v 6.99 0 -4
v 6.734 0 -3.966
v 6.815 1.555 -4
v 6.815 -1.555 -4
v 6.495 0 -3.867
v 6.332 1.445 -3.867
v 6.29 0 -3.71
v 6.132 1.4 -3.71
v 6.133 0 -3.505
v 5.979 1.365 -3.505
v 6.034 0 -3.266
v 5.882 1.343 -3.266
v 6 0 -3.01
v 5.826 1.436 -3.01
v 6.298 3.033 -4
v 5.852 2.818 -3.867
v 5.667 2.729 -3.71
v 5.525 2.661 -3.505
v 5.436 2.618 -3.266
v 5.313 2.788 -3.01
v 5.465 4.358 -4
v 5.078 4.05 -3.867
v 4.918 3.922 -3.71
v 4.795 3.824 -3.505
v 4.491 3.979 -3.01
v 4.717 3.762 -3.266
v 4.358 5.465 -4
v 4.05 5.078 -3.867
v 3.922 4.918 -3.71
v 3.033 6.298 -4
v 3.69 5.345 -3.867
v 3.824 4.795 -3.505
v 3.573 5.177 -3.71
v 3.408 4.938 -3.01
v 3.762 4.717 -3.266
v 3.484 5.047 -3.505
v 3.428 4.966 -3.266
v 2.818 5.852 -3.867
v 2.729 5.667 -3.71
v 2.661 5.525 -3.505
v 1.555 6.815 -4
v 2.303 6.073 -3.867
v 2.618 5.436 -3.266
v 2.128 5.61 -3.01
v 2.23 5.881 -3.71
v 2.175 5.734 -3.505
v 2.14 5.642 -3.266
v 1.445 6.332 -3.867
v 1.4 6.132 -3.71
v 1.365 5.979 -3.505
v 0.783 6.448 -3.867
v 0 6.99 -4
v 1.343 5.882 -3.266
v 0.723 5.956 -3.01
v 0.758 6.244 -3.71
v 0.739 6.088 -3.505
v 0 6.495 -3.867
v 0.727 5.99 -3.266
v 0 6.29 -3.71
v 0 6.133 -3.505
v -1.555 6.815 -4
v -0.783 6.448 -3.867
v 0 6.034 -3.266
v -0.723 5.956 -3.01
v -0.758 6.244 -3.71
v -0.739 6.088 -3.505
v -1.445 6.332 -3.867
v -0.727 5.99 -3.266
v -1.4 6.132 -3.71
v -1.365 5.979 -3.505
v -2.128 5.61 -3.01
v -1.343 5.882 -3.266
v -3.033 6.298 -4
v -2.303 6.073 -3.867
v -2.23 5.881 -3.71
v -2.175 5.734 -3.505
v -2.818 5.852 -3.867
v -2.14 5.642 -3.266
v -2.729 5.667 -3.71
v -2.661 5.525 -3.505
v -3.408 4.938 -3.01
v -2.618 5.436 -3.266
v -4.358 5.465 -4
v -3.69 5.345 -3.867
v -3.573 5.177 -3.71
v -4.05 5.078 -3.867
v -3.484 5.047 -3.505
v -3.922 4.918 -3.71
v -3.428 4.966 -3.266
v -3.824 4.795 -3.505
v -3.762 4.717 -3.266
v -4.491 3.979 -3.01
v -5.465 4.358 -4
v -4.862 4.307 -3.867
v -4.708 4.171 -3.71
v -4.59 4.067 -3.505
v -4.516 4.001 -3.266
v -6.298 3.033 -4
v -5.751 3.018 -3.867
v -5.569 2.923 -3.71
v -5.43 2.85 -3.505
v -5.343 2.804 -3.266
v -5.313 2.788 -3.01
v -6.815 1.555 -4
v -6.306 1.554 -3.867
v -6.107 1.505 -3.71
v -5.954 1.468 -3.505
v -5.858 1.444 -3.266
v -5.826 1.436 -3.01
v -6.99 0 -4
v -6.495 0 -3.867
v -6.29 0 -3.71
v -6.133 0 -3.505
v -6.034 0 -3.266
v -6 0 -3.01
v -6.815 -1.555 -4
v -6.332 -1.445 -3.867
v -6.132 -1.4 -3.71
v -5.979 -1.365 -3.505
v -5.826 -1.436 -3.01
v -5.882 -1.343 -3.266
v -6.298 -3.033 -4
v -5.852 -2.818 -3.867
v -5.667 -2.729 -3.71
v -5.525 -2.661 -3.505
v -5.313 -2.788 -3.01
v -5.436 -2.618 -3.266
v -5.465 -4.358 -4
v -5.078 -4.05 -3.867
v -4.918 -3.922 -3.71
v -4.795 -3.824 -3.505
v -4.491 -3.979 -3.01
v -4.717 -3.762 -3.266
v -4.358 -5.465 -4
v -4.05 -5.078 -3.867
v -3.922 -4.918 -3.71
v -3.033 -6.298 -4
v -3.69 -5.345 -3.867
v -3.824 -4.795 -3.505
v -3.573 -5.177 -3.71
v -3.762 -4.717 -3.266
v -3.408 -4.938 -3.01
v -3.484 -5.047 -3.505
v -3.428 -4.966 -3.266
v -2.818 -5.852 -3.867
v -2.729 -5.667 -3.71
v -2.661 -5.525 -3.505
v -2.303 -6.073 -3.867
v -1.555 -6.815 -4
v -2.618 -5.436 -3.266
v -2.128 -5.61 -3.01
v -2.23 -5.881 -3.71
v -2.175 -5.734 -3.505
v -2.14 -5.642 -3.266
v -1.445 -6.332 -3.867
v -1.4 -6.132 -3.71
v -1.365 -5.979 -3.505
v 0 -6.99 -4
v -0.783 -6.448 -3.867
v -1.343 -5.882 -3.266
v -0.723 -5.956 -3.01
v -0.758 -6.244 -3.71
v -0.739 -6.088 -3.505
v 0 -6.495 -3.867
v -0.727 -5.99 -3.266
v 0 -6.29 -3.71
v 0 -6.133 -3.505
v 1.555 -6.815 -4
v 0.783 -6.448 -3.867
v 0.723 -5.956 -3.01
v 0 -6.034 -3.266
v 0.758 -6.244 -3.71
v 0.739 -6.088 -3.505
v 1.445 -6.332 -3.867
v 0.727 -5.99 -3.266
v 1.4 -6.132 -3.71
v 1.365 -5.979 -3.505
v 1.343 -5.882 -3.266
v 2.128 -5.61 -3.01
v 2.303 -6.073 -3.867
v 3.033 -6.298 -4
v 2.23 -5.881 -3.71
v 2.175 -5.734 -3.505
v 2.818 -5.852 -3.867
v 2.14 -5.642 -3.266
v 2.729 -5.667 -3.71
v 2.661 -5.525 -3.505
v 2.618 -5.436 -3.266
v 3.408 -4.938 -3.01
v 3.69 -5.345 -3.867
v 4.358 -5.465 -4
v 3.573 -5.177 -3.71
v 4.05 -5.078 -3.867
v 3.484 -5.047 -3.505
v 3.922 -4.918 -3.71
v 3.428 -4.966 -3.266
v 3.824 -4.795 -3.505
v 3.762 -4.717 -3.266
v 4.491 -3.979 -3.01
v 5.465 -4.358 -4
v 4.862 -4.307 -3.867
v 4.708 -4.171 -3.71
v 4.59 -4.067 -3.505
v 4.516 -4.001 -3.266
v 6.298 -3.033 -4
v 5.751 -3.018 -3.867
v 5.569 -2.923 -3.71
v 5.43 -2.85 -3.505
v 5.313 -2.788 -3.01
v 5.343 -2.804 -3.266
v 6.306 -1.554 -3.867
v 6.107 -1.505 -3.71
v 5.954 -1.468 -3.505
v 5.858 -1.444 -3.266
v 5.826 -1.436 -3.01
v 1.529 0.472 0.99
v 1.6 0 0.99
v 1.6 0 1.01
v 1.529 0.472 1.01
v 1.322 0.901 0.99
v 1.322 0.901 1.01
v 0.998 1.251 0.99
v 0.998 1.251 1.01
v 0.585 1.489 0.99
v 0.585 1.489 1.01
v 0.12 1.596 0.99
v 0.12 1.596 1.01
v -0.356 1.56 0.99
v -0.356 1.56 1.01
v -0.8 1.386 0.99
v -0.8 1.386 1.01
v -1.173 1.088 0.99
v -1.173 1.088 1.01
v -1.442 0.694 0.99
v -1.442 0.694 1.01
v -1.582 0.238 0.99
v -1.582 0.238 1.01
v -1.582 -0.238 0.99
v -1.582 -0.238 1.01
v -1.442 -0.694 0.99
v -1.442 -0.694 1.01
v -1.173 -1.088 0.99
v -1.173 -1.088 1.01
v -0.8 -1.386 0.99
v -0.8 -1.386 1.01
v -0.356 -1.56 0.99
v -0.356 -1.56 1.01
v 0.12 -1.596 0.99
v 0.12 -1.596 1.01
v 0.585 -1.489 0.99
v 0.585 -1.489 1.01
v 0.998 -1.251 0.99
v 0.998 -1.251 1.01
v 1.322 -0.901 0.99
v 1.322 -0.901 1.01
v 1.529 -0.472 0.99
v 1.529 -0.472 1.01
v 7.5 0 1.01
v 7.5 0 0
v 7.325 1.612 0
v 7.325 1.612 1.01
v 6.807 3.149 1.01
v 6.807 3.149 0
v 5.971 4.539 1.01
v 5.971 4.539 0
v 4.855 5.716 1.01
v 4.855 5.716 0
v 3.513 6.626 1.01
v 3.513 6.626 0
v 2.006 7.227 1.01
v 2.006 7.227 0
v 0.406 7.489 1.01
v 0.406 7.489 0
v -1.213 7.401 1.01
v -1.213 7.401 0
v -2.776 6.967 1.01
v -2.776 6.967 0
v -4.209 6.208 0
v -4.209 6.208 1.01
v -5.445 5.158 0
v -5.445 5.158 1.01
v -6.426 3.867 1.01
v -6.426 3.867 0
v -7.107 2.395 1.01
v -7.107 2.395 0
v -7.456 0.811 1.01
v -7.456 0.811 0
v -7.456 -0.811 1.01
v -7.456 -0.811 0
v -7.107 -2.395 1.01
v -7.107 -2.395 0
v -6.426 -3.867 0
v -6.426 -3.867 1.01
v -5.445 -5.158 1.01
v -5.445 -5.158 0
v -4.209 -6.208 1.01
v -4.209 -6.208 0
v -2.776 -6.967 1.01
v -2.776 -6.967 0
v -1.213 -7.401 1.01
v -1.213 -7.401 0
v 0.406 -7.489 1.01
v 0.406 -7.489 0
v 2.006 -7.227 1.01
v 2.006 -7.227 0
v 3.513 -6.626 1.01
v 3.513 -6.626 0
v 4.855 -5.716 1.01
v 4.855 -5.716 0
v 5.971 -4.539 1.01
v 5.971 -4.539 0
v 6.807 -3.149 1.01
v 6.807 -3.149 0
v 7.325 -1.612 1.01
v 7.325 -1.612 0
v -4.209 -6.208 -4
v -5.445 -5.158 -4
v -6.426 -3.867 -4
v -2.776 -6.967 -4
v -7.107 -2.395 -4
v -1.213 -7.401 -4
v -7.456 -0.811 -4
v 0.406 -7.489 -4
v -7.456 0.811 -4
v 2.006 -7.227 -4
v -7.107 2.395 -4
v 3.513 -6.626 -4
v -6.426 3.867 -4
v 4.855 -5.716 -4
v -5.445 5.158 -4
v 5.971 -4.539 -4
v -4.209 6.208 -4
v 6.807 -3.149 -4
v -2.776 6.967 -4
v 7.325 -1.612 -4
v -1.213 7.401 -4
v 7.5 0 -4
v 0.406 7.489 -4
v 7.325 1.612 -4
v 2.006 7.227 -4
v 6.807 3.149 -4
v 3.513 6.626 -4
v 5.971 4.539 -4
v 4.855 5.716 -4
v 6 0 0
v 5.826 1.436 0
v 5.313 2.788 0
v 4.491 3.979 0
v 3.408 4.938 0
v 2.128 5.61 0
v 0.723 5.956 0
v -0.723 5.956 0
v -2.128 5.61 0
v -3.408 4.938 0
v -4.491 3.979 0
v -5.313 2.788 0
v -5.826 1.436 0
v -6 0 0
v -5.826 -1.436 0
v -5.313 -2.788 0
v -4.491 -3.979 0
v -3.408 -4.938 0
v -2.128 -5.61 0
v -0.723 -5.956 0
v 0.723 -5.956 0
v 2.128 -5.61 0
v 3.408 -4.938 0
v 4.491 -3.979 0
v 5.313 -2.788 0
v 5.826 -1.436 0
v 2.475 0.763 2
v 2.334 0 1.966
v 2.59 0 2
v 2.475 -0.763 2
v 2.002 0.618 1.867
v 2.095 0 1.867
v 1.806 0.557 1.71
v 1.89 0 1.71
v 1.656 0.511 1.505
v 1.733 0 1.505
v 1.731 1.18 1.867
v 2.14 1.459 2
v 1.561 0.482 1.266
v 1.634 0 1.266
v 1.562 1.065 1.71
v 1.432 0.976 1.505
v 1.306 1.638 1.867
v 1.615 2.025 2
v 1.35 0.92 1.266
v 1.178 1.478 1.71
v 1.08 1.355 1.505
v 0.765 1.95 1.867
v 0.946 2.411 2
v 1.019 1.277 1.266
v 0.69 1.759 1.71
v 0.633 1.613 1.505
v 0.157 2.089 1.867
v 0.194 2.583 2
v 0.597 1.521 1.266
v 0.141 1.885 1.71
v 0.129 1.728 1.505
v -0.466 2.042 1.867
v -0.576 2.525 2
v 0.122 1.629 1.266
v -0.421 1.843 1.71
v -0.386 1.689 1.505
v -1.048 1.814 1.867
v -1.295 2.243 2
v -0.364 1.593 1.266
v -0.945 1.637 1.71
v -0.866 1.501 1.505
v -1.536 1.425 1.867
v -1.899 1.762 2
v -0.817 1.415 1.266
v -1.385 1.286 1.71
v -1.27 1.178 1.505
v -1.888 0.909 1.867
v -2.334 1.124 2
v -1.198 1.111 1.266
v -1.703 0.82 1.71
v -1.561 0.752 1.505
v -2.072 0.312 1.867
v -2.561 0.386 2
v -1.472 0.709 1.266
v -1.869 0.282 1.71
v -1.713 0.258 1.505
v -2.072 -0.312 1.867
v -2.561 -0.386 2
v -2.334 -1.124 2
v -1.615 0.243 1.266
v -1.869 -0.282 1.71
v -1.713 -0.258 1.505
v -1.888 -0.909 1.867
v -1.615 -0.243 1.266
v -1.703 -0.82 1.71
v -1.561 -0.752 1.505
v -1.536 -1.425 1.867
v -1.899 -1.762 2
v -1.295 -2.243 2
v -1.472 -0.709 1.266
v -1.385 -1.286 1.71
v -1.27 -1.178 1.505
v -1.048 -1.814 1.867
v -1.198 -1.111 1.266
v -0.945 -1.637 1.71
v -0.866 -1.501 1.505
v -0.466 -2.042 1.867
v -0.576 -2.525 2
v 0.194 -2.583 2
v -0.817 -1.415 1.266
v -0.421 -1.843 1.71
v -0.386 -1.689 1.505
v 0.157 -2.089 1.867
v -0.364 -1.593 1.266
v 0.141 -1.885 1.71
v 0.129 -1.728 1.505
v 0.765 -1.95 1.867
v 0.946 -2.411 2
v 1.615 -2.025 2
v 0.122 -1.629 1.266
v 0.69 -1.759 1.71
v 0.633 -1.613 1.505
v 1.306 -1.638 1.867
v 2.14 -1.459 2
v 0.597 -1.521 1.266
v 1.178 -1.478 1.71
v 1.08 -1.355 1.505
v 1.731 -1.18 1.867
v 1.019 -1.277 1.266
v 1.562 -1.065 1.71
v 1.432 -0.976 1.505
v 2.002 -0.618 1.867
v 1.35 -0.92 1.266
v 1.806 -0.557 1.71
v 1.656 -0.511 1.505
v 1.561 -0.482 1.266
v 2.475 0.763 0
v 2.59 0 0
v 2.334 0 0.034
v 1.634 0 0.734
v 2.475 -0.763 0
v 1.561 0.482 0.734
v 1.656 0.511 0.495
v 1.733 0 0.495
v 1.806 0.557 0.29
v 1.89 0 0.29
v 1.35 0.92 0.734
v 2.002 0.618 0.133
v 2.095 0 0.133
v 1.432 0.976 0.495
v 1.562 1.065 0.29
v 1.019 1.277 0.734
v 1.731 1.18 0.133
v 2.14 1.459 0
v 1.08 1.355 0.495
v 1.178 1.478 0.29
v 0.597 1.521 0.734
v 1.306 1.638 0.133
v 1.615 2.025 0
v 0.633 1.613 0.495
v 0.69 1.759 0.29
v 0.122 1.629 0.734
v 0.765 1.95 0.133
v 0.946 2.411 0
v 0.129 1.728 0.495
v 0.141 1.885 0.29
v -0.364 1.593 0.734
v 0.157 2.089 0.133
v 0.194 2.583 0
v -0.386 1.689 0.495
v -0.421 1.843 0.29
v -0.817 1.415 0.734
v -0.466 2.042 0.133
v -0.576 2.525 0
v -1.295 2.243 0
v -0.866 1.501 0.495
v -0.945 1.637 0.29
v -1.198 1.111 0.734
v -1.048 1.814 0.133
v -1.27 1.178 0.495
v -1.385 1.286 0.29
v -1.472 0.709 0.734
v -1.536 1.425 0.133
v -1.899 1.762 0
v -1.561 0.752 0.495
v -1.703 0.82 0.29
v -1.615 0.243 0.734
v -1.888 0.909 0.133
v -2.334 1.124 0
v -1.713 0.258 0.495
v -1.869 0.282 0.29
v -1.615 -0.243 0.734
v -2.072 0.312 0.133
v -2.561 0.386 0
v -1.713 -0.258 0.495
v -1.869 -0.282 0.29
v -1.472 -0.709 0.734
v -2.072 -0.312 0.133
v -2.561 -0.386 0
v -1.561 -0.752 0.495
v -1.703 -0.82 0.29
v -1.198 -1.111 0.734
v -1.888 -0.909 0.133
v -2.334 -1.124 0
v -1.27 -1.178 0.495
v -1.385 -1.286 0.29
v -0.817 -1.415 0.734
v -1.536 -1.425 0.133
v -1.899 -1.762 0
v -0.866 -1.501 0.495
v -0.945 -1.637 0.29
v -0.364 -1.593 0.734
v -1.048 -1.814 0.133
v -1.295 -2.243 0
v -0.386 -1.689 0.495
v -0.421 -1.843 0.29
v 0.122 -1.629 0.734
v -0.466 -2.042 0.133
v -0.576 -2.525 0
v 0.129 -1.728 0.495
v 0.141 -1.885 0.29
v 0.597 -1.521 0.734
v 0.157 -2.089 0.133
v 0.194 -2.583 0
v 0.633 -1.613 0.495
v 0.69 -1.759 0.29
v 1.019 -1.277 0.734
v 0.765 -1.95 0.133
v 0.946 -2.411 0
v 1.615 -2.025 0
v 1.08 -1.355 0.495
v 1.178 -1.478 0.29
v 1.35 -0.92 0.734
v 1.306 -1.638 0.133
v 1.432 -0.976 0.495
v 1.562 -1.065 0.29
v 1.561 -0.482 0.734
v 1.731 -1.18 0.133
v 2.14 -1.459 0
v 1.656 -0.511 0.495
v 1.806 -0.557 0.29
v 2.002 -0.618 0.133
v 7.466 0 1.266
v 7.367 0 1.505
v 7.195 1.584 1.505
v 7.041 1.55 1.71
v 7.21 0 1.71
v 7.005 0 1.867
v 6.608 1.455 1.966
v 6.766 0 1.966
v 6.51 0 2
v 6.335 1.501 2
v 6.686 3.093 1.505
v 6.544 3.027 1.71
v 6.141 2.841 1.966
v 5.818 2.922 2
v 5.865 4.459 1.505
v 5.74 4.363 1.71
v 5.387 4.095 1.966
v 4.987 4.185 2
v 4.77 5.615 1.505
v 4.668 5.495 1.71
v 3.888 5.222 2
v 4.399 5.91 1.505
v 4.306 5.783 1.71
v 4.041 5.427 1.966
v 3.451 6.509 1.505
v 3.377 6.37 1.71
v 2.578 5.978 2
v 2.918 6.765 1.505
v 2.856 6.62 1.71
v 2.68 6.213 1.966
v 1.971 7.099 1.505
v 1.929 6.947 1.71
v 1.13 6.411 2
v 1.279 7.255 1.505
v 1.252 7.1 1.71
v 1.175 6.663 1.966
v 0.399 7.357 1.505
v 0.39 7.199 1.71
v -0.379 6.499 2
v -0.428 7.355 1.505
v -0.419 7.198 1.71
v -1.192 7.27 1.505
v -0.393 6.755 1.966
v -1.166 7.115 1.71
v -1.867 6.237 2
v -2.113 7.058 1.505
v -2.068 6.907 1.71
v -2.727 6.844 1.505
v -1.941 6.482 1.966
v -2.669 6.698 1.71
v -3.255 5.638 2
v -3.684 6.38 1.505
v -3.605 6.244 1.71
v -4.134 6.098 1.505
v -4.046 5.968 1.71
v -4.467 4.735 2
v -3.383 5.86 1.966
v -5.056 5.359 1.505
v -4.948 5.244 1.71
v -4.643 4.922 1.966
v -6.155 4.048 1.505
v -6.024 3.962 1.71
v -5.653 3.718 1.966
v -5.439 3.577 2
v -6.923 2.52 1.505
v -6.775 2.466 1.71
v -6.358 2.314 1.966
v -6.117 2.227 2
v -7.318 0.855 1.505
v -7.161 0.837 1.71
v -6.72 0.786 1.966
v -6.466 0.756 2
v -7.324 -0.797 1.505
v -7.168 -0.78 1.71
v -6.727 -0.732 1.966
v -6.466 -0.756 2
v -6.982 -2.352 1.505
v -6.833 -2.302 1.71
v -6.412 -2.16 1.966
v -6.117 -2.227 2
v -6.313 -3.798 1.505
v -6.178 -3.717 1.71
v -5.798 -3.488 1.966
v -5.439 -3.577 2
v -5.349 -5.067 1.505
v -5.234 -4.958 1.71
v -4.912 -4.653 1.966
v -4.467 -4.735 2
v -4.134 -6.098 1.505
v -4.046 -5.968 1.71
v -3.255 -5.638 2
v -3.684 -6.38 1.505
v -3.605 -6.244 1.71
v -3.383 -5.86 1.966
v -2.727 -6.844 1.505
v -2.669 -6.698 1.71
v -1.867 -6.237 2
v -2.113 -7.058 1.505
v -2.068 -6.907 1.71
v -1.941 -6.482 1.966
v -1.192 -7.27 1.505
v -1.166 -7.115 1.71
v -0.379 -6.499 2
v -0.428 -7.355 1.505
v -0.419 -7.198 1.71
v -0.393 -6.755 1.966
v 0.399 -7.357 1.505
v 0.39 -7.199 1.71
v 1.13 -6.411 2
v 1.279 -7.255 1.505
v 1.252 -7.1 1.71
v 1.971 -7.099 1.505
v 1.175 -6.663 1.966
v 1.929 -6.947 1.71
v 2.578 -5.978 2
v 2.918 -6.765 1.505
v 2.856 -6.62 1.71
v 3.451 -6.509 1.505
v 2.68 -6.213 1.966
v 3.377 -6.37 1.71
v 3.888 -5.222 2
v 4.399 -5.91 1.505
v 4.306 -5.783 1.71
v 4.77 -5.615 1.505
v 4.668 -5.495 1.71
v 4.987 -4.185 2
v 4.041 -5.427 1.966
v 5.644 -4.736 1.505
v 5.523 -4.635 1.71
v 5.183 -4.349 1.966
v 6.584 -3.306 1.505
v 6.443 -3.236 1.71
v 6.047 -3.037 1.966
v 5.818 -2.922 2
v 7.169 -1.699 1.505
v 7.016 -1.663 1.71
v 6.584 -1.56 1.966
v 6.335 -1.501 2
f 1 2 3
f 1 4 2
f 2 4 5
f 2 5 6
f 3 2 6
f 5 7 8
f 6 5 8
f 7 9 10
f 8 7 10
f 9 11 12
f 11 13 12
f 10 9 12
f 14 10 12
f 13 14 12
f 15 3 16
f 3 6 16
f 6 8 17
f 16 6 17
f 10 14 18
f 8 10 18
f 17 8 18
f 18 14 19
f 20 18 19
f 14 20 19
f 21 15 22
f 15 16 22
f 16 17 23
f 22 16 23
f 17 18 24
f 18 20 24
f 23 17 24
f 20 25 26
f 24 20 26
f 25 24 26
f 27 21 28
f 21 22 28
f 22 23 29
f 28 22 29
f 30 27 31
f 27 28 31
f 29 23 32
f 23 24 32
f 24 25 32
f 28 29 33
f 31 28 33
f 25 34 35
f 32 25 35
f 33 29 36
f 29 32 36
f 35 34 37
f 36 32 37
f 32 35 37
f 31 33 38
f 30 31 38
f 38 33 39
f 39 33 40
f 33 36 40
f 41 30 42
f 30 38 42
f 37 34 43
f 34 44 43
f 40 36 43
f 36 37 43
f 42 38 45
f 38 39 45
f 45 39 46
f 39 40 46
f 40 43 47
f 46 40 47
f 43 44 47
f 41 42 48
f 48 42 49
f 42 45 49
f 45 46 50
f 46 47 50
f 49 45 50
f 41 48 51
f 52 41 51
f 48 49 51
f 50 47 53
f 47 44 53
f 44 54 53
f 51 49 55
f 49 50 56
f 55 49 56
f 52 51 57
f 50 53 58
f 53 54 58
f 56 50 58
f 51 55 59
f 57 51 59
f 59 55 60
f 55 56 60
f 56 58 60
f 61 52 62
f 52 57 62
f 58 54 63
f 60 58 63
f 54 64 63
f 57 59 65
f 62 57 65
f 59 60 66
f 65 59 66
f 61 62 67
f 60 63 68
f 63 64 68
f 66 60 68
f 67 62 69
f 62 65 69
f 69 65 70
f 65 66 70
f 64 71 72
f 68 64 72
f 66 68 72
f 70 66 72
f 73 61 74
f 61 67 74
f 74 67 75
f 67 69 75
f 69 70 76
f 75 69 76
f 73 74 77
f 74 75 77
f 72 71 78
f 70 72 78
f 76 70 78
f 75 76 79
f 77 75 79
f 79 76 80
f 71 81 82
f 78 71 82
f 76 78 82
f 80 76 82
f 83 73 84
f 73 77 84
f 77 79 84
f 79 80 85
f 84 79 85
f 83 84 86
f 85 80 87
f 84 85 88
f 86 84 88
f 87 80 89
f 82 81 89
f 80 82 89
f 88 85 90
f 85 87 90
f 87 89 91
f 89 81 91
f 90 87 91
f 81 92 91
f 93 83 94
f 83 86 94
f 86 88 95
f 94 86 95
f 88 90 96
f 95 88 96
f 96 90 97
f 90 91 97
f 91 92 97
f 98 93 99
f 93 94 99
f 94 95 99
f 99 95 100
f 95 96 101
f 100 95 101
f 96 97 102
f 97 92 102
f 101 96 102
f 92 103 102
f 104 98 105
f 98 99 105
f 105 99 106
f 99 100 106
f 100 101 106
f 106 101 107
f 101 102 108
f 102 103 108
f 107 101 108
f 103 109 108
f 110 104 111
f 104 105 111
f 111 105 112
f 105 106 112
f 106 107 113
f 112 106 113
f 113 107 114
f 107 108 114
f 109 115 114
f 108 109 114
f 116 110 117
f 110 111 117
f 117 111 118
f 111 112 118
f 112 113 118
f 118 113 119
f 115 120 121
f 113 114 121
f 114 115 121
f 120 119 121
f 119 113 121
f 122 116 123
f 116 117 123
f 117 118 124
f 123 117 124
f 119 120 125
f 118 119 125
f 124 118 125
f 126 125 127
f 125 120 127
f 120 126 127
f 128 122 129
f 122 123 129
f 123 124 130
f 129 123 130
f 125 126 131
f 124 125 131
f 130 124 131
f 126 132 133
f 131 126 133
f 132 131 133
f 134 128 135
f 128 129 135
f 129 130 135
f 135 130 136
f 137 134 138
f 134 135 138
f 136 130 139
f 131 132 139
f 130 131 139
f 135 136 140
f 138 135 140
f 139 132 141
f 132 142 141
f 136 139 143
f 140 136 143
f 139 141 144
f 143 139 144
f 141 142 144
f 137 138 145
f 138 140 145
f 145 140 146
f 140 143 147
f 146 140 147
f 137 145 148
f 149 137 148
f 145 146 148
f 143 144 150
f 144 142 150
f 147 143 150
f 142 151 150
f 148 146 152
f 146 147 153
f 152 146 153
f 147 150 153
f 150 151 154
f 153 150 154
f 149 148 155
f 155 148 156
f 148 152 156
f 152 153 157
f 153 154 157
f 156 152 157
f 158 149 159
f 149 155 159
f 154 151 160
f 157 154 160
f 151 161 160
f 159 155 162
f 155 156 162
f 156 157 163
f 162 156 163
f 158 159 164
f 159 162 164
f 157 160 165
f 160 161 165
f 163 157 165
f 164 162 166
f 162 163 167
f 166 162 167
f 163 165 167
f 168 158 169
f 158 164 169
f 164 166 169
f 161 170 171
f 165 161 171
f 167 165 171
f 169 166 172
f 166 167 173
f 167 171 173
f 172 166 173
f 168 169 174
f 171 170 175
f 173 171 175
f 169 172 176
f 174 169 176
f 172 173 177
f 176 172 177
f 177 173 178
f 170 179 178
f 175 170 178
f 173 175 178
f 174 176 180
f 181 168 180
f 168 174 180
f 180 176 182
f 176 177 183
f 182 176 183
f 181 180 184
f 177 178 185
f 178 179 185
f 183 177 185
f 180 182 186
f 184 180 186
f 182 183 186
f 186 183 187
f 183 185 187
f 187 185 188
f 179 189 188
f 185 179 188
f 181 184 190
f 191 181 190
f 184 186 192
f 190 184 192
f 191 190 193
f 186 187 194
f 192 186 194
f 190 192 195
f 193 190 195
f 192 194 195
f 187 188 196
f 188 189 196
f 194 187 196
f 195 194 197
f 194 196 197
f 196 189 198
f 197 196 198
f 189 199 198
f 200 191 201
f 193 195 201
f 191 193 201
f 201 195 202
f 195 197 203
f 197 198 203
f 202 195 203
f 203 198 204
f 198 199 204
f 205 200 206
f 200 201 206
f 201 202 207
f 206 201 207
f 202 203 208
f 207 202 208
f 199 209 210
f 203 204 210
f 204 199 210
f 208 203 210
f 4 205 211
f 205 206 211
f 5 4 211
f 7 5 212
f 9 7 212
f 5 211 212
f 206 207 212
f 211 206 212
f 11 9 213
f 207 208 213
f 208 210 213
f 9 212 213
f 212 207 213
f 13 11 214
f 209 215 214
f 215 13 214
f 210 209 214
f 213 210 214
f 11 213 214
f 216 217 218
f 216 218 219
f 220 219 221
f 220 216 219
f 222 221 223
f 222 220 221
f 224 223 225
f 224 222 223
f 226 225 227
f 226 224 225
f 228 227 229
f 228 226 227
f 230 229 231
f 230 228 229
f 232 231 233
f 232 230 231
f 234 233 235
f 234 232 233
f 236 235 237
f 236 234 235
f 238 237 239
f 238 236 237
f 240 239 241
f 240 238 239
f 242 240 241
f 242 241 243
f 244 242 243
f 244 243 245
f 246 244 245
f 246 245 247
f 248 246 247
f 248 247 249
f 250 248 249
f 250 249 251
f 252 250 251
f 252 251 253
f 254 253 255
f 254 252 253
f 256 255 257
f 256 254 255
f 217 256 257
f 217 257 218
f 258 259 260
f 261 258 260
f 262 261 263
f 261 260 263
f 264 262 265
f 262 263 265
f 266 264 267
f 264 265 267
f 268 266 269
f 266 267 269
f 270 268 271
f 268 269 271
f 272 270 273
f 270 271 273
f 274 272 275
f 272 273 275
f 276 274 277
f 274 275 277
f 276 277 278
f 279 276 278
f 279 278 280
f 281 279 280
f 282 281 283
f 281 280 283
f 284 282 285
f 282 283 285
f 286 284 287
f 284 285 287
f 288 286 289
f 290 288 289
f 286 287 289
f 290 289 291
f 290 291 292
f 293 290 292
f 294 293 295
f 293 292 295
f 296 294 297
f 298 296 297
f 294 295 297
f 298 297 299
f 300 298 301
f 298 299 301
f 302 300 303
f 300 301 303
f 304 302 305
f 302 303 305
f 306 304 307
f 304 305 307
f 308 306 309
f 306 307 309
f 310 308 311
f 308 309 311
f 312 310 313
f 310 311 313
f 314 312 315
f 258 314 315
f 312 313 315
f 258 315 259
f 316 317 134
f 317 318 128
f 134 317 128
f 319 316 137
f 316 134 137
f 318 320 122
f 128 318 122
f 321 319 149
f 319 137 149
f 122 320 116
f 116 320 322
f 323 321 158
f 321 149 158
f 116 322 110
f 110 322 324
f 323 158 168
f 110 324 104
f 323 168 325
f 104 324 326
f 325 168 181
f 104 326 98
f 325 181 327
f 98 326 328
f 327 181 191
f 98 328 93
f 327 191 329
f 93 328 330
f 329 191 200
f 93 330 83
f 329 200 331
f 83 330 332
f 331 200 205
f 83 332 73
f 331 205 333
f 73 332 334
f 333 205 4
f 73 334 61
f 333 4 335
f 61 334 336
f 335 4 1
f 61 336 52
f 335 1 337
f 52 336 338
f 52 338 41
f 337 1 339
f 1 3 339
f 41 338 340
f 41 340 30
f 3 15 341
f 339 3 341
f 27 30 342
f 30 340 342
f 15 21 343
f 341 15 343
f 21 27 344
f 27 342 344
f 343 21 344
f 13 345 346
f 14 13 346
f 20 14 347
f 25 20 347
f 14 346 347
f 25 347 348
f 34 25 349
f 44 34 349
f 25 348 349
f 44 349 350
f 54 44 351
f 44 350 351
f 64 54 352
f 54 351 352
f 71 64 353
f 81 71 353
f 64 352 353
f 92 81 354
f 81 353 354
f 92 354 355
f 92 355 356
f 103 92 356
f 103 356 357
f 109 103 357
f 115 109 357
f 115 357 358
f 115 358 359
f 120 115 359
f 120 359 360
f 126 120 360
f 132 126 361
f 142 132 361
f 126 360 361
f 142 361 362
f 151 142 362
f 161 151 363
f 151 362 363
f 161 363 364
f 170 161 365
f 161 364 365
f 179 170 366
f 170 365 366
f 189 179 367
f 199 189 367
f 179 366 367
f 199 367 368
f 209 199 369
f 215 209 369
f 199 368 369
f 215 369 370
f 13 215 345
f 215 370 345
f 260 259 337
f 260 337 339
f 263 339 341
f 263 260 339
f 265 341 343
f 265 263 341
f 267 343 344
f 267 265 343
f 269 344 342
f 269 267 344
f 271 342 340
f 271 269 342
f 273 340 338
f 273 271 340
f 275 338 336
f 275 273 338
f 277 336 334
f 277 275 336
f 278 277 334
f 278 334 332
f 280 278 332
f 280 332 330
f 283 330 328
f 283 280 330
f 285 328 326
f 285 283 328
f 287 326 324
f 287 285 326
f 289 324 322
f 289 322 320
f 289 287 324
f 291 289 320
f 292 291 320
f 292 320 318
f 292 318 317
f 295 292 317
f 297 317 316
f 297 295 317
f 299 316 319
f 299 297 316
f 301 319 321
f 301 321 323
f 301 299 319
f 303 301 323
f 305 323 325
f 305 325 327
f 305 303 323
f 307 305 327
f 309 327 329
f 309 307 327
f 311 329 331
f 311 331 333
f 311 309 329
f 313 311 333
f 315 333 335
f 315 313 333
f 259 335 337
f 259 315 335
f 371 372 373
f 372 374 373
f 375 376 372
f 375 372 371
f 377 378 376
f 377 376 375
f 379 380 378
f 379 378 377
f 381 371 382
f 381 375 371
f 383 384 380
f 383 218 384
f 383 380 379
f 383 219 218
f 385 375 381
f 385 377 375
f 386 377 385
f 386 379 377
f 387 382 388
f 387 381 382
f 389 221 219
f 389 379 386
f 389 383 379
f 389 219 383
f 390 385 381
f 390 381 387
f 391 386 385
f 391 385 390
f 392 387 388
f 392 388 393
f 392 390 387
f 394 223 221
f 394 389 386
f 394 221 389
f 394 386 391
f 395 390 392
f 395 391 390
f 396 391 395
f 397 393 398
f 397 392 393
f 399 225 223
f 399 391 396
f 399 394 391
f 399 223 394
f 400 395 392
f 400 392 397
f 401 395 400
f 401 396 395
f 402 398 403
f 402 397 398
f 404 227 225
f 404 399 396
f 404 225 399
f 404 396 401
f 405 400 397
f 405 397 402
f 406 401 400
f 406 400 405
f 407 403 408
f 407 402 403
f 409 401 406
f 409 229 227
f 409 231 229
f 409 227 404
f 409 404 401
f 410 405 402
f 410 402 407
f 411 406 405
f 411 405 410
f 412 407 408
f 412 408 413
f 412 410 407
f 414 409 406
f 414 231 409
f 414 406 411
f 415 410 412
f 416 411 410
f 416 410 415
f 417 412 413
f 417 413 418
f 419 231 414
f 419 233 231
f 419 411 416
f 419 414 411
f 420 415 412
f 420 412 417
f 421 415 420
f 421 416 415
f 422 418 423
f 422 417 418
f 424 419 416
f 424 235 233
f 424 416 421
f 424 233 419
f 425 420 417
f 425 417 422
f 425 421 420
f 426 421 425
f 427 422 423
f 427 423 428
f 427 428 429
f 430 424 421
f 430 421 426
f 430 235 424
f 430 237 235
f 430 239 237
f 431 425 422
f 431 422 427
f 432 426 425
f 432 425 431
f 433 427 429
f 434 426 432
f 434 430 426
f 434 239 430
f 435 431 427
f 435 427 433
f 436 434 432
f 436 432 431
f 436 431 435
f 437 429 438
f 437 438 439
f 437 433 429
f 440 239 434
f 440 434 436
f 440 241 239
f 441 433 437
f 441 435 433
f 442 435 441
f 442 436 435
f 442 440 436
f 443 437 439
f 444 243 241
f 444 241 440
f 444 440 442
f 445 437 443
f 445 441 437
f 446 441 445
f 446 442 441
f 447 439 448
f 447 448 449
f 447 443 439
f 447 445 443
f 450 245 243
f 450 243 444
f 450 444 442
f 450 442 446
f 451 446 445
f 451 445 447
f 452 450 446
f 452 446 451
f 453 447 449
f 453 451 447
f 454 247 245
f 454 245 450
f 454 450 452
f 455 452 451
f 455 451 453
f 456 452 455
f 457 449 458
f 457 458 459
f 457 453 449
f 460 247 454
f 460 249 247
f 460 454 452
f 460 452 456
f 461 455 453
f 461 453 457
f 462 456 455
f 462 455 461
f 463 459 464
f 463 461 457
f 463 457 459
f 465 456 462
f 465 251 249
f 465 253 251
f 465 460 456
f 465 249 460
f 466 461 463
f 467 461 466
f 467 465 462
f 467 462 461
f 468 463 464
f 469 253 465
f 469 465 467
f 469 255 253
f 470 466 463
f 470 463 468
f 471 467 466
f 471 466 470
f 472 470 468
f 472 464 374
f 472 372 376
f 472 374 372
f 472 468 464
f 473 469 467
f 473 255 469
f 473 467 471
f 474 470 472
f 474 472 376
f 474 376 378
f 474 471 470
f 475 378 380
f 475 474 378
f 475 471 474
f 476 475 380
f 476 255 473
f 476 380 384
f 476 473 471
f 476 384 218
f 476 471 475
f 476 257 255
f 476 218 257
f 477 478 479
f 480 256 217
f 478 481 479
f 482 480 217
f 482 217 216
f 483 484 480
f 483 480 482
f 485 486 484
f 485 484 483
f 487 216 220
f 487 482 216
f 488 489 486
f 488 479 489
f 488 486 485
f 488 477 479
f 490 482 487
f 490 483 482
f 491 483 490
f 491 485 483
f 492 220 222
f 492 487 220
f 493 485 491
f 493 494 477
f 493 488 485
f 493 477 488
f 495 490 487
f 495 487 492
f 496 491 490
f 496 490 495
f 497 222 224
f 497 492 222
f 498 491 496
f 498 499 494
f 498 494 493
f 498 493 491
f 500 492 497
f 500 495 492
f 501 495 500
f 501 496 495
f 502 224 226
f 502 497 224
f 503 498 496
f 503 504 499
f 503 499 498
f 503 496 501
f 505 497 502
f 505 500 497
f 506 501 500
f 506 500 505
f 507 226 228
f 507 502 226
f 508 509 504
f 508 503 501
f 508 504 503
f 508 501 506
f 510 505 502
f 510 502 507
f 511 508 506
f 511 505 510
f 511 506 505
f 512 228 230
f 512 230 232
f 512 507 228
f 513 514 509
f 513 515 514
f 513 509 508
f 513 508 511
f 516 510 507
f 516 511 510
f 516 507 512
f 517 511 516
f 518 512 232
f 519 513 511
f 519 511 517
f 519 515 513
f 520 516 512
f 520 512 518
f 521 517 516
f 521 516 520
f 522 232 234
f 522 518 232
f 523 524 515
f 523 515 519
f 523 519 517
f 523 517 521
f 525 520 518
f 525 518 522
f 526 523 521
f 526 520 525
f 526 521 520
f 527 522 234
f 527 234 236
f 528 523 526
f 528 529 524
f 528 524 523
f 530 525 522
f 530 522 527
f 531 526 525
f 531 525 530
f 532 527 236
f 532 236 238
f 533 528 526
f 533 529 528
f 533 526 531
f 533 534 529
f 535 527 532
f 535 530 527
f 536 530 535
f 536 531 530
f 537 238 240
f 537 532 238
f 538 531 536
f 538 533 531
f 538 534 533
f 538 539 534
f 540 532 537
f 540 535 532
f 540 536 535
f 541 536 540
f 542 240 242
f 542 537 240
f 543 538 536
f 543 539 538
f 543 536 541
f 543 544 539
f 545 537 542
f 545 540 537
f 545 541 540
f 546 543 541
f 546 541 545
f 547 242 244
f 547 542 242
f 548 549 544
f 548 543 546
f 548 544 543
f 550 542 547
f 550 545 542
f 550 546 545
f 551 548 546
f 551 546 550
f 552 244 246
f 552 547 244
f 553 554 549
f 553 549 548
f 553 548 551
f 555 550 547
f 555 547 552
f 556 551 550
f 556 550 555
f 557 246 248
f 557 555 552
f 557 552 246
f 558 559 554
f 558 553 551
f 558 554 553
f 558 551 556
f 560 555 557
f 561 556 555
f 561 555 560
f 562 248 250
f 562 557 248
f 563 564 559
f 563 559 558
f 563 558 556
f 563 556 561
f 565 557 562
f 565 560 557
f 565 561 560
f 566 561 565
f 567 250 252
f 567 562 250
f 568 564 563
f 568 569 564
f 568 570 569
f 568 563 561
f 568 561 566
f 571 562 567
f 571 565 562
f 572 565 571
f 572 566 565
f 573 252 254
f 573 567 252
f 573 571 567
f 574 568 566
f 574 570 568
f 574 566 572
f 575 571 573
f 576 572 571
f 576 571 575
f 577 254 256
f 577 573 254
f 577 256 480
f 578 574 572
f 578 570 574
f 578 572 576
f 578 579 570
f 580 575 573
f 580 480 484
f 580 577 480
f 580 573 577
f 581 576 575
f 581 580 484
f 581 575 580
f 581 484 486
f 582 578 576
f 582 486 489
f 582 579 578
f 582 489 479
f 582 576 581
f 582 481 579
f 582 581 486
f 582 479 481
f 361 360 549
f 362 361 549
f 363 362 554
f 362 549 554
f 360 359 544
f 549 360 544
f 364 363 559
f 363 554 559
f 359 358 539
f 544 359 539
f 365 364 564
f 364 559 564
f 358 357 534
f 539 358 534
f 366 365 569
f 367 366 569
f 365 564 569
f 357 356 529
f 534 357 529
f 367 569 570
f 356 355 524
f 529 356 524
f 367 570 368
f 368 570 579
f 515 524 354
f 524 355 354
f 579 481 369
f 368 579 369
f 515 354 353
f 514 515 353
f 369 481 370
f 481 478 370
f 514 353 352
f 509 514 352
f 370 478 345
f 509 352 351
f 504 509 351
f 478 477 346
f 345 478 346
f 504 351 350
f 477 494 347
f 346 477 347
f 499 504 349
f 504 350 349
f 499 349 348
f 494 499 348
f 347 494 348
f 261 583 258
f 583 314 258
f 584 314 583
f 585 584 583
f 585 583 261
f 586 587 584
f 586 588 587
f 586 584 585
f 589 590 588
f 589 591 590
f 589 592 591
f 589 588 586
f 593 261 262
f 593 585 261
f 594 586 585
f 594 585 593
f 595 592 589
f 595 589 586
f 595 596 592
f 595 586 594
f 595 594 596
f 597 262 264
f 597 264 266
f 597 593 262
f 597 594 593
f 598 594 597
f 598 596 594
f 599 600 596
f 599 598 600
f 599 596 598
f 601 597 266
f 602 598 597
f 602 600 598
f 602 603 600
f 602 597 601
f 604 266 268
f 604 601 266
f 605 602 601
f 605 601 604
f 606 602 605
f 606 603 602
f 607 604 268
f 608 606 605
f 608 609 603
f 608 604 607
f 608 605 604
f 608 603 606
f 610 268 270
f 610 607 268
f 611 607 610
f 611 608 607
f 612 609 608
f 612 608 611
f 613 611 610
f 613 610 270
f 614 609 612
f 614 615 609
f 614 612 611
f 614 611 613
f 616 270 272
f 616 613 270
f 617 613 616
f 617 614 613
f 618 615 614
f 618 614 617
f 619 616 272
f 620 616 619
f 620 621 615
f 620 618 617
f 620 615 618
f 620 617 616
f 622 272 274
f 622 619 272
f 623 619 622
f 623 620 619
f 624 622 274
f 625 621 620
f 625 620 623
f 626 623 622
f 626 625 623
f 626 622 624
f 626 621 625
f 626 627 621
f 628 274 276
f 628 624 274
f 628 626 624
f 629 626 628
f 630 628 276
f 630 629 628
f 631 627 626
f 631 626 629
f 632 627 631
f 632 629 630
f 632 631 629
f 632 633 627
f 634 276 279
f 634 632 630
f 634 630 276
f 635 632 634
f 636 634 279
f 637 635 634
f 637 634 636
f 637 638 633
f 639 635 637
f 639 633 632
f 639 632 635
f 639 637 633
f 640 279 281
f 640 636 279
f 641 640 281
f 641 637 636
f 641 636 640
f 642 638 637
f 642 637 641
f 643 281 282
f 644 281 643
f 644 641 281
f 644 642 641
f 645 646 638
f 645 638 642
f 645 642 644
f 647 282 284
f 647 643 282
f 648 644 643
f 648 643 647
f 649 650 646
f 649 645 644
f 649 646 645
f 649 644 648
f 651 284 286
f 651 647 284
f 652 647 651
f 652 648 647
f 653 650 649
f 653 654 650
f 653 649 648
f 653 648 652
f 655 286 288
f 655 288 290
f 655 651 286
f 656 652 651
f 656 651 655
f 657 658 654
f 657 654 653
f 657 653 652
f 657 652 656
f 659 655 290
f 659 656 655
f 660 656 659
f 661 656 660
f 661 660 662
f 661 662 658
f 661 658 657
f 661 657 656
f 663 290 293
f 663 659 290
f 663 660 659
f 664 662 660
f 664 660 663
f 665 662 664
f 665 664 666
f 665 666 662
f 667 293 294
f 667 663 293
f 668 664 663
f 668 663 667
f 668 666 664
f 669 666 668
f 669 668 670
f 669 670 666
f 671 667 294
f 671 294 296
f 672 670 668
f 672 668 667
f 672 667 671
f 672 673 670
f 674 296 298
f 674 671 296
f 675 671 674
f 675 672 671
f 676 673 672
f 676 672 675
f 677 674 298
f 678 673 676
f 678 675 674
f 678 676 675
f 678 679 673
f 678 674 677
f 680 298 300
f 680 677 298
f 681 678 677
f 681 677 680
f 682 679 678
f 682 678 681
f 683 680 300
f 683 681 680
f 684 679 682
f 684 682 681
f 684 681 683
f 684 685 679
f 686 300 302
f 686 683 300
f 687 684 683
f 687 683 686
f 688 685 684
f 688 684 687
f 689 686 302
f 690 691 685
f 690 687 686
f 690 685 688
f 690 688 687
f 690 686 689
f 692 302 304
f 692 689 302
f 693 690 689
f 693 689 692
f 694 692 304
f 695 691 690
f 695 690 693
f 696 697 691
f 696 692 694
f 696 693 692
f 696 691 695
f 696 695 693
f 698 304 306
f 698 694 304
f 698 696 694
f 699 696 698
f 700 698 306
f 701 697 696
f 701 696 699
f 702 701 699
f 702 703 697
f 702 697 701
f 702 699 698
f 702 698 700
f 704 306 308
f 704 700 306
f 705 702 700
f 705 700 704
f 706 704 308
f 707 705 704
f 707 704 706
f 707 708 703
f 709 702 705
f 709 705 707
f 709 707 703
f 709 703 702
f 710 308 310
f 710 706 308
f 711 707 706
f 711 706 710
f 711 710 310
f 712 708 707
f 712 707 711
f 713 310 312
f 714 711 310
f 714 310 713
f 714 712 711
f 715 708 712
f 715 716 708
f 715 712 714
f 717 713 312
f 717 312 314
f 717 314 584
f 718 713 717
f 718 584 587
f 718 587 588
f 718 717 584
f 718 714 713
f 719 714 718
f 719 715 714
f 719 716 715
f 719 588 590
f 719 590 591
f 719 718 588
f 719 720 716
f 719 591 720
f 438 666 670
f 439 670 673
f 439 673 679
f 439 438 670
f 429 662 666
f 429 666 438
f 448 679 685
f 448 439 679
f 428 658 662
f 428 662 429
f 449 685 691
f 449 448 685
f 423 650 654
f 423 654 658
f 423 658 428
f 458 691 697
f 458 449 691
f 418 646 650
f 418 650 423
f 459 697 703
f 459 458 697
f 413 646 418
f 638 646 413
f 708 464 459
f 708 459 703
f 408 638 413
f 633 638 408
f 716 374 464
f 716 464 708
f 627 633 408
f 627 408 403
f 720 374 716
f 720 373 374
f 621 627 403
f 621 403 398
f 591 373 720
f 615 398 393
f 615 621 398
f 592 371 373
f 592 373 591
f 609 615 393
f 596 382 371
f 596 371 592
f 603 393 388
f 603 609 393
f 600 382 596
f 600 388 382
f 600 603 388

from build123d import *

# Parameters (mm, degrees)
SKETCH_R      = 7.5
SKETCH_R_2    = 6
PAD_DEPTH     = 4
SKETCH001_R   = 7.5
SKETCH001_R_2 = 1.6
PAD001_DEPTH  = 2
FILLET_R      = 0.99


with BuildPart() as part:
    # Sketch → Pad (new body)
    with BuildSketch(Plane.XY):
        Circle(SKETCH_R)
        Circle(SKETCH_R_2, mode=Mode.SUBTRACT)
    extrude(amount=-PAD_DEPTH)

    # Sketch001 → Pad001 (join)
    with BuildSketch(Plane.XY):
        Circle(SKETCH001_R)
        Circle(SKETCH001_R_2, mode=Mode.SUBTRACT)
    extrude(amount=PAD001_DEPTH)

    # Fillet
    fillet_edges = [part.edges().sort_by_distance(p)[0] for p in [
        (-1.6, 0, 2),
        (-1.6, 0, 0),
        (-7.5, 0, 2),
        (-6, 0, -4),
    ]]
    fillet(fillet_edges, radius=FILLET_R)


solid = part.part
